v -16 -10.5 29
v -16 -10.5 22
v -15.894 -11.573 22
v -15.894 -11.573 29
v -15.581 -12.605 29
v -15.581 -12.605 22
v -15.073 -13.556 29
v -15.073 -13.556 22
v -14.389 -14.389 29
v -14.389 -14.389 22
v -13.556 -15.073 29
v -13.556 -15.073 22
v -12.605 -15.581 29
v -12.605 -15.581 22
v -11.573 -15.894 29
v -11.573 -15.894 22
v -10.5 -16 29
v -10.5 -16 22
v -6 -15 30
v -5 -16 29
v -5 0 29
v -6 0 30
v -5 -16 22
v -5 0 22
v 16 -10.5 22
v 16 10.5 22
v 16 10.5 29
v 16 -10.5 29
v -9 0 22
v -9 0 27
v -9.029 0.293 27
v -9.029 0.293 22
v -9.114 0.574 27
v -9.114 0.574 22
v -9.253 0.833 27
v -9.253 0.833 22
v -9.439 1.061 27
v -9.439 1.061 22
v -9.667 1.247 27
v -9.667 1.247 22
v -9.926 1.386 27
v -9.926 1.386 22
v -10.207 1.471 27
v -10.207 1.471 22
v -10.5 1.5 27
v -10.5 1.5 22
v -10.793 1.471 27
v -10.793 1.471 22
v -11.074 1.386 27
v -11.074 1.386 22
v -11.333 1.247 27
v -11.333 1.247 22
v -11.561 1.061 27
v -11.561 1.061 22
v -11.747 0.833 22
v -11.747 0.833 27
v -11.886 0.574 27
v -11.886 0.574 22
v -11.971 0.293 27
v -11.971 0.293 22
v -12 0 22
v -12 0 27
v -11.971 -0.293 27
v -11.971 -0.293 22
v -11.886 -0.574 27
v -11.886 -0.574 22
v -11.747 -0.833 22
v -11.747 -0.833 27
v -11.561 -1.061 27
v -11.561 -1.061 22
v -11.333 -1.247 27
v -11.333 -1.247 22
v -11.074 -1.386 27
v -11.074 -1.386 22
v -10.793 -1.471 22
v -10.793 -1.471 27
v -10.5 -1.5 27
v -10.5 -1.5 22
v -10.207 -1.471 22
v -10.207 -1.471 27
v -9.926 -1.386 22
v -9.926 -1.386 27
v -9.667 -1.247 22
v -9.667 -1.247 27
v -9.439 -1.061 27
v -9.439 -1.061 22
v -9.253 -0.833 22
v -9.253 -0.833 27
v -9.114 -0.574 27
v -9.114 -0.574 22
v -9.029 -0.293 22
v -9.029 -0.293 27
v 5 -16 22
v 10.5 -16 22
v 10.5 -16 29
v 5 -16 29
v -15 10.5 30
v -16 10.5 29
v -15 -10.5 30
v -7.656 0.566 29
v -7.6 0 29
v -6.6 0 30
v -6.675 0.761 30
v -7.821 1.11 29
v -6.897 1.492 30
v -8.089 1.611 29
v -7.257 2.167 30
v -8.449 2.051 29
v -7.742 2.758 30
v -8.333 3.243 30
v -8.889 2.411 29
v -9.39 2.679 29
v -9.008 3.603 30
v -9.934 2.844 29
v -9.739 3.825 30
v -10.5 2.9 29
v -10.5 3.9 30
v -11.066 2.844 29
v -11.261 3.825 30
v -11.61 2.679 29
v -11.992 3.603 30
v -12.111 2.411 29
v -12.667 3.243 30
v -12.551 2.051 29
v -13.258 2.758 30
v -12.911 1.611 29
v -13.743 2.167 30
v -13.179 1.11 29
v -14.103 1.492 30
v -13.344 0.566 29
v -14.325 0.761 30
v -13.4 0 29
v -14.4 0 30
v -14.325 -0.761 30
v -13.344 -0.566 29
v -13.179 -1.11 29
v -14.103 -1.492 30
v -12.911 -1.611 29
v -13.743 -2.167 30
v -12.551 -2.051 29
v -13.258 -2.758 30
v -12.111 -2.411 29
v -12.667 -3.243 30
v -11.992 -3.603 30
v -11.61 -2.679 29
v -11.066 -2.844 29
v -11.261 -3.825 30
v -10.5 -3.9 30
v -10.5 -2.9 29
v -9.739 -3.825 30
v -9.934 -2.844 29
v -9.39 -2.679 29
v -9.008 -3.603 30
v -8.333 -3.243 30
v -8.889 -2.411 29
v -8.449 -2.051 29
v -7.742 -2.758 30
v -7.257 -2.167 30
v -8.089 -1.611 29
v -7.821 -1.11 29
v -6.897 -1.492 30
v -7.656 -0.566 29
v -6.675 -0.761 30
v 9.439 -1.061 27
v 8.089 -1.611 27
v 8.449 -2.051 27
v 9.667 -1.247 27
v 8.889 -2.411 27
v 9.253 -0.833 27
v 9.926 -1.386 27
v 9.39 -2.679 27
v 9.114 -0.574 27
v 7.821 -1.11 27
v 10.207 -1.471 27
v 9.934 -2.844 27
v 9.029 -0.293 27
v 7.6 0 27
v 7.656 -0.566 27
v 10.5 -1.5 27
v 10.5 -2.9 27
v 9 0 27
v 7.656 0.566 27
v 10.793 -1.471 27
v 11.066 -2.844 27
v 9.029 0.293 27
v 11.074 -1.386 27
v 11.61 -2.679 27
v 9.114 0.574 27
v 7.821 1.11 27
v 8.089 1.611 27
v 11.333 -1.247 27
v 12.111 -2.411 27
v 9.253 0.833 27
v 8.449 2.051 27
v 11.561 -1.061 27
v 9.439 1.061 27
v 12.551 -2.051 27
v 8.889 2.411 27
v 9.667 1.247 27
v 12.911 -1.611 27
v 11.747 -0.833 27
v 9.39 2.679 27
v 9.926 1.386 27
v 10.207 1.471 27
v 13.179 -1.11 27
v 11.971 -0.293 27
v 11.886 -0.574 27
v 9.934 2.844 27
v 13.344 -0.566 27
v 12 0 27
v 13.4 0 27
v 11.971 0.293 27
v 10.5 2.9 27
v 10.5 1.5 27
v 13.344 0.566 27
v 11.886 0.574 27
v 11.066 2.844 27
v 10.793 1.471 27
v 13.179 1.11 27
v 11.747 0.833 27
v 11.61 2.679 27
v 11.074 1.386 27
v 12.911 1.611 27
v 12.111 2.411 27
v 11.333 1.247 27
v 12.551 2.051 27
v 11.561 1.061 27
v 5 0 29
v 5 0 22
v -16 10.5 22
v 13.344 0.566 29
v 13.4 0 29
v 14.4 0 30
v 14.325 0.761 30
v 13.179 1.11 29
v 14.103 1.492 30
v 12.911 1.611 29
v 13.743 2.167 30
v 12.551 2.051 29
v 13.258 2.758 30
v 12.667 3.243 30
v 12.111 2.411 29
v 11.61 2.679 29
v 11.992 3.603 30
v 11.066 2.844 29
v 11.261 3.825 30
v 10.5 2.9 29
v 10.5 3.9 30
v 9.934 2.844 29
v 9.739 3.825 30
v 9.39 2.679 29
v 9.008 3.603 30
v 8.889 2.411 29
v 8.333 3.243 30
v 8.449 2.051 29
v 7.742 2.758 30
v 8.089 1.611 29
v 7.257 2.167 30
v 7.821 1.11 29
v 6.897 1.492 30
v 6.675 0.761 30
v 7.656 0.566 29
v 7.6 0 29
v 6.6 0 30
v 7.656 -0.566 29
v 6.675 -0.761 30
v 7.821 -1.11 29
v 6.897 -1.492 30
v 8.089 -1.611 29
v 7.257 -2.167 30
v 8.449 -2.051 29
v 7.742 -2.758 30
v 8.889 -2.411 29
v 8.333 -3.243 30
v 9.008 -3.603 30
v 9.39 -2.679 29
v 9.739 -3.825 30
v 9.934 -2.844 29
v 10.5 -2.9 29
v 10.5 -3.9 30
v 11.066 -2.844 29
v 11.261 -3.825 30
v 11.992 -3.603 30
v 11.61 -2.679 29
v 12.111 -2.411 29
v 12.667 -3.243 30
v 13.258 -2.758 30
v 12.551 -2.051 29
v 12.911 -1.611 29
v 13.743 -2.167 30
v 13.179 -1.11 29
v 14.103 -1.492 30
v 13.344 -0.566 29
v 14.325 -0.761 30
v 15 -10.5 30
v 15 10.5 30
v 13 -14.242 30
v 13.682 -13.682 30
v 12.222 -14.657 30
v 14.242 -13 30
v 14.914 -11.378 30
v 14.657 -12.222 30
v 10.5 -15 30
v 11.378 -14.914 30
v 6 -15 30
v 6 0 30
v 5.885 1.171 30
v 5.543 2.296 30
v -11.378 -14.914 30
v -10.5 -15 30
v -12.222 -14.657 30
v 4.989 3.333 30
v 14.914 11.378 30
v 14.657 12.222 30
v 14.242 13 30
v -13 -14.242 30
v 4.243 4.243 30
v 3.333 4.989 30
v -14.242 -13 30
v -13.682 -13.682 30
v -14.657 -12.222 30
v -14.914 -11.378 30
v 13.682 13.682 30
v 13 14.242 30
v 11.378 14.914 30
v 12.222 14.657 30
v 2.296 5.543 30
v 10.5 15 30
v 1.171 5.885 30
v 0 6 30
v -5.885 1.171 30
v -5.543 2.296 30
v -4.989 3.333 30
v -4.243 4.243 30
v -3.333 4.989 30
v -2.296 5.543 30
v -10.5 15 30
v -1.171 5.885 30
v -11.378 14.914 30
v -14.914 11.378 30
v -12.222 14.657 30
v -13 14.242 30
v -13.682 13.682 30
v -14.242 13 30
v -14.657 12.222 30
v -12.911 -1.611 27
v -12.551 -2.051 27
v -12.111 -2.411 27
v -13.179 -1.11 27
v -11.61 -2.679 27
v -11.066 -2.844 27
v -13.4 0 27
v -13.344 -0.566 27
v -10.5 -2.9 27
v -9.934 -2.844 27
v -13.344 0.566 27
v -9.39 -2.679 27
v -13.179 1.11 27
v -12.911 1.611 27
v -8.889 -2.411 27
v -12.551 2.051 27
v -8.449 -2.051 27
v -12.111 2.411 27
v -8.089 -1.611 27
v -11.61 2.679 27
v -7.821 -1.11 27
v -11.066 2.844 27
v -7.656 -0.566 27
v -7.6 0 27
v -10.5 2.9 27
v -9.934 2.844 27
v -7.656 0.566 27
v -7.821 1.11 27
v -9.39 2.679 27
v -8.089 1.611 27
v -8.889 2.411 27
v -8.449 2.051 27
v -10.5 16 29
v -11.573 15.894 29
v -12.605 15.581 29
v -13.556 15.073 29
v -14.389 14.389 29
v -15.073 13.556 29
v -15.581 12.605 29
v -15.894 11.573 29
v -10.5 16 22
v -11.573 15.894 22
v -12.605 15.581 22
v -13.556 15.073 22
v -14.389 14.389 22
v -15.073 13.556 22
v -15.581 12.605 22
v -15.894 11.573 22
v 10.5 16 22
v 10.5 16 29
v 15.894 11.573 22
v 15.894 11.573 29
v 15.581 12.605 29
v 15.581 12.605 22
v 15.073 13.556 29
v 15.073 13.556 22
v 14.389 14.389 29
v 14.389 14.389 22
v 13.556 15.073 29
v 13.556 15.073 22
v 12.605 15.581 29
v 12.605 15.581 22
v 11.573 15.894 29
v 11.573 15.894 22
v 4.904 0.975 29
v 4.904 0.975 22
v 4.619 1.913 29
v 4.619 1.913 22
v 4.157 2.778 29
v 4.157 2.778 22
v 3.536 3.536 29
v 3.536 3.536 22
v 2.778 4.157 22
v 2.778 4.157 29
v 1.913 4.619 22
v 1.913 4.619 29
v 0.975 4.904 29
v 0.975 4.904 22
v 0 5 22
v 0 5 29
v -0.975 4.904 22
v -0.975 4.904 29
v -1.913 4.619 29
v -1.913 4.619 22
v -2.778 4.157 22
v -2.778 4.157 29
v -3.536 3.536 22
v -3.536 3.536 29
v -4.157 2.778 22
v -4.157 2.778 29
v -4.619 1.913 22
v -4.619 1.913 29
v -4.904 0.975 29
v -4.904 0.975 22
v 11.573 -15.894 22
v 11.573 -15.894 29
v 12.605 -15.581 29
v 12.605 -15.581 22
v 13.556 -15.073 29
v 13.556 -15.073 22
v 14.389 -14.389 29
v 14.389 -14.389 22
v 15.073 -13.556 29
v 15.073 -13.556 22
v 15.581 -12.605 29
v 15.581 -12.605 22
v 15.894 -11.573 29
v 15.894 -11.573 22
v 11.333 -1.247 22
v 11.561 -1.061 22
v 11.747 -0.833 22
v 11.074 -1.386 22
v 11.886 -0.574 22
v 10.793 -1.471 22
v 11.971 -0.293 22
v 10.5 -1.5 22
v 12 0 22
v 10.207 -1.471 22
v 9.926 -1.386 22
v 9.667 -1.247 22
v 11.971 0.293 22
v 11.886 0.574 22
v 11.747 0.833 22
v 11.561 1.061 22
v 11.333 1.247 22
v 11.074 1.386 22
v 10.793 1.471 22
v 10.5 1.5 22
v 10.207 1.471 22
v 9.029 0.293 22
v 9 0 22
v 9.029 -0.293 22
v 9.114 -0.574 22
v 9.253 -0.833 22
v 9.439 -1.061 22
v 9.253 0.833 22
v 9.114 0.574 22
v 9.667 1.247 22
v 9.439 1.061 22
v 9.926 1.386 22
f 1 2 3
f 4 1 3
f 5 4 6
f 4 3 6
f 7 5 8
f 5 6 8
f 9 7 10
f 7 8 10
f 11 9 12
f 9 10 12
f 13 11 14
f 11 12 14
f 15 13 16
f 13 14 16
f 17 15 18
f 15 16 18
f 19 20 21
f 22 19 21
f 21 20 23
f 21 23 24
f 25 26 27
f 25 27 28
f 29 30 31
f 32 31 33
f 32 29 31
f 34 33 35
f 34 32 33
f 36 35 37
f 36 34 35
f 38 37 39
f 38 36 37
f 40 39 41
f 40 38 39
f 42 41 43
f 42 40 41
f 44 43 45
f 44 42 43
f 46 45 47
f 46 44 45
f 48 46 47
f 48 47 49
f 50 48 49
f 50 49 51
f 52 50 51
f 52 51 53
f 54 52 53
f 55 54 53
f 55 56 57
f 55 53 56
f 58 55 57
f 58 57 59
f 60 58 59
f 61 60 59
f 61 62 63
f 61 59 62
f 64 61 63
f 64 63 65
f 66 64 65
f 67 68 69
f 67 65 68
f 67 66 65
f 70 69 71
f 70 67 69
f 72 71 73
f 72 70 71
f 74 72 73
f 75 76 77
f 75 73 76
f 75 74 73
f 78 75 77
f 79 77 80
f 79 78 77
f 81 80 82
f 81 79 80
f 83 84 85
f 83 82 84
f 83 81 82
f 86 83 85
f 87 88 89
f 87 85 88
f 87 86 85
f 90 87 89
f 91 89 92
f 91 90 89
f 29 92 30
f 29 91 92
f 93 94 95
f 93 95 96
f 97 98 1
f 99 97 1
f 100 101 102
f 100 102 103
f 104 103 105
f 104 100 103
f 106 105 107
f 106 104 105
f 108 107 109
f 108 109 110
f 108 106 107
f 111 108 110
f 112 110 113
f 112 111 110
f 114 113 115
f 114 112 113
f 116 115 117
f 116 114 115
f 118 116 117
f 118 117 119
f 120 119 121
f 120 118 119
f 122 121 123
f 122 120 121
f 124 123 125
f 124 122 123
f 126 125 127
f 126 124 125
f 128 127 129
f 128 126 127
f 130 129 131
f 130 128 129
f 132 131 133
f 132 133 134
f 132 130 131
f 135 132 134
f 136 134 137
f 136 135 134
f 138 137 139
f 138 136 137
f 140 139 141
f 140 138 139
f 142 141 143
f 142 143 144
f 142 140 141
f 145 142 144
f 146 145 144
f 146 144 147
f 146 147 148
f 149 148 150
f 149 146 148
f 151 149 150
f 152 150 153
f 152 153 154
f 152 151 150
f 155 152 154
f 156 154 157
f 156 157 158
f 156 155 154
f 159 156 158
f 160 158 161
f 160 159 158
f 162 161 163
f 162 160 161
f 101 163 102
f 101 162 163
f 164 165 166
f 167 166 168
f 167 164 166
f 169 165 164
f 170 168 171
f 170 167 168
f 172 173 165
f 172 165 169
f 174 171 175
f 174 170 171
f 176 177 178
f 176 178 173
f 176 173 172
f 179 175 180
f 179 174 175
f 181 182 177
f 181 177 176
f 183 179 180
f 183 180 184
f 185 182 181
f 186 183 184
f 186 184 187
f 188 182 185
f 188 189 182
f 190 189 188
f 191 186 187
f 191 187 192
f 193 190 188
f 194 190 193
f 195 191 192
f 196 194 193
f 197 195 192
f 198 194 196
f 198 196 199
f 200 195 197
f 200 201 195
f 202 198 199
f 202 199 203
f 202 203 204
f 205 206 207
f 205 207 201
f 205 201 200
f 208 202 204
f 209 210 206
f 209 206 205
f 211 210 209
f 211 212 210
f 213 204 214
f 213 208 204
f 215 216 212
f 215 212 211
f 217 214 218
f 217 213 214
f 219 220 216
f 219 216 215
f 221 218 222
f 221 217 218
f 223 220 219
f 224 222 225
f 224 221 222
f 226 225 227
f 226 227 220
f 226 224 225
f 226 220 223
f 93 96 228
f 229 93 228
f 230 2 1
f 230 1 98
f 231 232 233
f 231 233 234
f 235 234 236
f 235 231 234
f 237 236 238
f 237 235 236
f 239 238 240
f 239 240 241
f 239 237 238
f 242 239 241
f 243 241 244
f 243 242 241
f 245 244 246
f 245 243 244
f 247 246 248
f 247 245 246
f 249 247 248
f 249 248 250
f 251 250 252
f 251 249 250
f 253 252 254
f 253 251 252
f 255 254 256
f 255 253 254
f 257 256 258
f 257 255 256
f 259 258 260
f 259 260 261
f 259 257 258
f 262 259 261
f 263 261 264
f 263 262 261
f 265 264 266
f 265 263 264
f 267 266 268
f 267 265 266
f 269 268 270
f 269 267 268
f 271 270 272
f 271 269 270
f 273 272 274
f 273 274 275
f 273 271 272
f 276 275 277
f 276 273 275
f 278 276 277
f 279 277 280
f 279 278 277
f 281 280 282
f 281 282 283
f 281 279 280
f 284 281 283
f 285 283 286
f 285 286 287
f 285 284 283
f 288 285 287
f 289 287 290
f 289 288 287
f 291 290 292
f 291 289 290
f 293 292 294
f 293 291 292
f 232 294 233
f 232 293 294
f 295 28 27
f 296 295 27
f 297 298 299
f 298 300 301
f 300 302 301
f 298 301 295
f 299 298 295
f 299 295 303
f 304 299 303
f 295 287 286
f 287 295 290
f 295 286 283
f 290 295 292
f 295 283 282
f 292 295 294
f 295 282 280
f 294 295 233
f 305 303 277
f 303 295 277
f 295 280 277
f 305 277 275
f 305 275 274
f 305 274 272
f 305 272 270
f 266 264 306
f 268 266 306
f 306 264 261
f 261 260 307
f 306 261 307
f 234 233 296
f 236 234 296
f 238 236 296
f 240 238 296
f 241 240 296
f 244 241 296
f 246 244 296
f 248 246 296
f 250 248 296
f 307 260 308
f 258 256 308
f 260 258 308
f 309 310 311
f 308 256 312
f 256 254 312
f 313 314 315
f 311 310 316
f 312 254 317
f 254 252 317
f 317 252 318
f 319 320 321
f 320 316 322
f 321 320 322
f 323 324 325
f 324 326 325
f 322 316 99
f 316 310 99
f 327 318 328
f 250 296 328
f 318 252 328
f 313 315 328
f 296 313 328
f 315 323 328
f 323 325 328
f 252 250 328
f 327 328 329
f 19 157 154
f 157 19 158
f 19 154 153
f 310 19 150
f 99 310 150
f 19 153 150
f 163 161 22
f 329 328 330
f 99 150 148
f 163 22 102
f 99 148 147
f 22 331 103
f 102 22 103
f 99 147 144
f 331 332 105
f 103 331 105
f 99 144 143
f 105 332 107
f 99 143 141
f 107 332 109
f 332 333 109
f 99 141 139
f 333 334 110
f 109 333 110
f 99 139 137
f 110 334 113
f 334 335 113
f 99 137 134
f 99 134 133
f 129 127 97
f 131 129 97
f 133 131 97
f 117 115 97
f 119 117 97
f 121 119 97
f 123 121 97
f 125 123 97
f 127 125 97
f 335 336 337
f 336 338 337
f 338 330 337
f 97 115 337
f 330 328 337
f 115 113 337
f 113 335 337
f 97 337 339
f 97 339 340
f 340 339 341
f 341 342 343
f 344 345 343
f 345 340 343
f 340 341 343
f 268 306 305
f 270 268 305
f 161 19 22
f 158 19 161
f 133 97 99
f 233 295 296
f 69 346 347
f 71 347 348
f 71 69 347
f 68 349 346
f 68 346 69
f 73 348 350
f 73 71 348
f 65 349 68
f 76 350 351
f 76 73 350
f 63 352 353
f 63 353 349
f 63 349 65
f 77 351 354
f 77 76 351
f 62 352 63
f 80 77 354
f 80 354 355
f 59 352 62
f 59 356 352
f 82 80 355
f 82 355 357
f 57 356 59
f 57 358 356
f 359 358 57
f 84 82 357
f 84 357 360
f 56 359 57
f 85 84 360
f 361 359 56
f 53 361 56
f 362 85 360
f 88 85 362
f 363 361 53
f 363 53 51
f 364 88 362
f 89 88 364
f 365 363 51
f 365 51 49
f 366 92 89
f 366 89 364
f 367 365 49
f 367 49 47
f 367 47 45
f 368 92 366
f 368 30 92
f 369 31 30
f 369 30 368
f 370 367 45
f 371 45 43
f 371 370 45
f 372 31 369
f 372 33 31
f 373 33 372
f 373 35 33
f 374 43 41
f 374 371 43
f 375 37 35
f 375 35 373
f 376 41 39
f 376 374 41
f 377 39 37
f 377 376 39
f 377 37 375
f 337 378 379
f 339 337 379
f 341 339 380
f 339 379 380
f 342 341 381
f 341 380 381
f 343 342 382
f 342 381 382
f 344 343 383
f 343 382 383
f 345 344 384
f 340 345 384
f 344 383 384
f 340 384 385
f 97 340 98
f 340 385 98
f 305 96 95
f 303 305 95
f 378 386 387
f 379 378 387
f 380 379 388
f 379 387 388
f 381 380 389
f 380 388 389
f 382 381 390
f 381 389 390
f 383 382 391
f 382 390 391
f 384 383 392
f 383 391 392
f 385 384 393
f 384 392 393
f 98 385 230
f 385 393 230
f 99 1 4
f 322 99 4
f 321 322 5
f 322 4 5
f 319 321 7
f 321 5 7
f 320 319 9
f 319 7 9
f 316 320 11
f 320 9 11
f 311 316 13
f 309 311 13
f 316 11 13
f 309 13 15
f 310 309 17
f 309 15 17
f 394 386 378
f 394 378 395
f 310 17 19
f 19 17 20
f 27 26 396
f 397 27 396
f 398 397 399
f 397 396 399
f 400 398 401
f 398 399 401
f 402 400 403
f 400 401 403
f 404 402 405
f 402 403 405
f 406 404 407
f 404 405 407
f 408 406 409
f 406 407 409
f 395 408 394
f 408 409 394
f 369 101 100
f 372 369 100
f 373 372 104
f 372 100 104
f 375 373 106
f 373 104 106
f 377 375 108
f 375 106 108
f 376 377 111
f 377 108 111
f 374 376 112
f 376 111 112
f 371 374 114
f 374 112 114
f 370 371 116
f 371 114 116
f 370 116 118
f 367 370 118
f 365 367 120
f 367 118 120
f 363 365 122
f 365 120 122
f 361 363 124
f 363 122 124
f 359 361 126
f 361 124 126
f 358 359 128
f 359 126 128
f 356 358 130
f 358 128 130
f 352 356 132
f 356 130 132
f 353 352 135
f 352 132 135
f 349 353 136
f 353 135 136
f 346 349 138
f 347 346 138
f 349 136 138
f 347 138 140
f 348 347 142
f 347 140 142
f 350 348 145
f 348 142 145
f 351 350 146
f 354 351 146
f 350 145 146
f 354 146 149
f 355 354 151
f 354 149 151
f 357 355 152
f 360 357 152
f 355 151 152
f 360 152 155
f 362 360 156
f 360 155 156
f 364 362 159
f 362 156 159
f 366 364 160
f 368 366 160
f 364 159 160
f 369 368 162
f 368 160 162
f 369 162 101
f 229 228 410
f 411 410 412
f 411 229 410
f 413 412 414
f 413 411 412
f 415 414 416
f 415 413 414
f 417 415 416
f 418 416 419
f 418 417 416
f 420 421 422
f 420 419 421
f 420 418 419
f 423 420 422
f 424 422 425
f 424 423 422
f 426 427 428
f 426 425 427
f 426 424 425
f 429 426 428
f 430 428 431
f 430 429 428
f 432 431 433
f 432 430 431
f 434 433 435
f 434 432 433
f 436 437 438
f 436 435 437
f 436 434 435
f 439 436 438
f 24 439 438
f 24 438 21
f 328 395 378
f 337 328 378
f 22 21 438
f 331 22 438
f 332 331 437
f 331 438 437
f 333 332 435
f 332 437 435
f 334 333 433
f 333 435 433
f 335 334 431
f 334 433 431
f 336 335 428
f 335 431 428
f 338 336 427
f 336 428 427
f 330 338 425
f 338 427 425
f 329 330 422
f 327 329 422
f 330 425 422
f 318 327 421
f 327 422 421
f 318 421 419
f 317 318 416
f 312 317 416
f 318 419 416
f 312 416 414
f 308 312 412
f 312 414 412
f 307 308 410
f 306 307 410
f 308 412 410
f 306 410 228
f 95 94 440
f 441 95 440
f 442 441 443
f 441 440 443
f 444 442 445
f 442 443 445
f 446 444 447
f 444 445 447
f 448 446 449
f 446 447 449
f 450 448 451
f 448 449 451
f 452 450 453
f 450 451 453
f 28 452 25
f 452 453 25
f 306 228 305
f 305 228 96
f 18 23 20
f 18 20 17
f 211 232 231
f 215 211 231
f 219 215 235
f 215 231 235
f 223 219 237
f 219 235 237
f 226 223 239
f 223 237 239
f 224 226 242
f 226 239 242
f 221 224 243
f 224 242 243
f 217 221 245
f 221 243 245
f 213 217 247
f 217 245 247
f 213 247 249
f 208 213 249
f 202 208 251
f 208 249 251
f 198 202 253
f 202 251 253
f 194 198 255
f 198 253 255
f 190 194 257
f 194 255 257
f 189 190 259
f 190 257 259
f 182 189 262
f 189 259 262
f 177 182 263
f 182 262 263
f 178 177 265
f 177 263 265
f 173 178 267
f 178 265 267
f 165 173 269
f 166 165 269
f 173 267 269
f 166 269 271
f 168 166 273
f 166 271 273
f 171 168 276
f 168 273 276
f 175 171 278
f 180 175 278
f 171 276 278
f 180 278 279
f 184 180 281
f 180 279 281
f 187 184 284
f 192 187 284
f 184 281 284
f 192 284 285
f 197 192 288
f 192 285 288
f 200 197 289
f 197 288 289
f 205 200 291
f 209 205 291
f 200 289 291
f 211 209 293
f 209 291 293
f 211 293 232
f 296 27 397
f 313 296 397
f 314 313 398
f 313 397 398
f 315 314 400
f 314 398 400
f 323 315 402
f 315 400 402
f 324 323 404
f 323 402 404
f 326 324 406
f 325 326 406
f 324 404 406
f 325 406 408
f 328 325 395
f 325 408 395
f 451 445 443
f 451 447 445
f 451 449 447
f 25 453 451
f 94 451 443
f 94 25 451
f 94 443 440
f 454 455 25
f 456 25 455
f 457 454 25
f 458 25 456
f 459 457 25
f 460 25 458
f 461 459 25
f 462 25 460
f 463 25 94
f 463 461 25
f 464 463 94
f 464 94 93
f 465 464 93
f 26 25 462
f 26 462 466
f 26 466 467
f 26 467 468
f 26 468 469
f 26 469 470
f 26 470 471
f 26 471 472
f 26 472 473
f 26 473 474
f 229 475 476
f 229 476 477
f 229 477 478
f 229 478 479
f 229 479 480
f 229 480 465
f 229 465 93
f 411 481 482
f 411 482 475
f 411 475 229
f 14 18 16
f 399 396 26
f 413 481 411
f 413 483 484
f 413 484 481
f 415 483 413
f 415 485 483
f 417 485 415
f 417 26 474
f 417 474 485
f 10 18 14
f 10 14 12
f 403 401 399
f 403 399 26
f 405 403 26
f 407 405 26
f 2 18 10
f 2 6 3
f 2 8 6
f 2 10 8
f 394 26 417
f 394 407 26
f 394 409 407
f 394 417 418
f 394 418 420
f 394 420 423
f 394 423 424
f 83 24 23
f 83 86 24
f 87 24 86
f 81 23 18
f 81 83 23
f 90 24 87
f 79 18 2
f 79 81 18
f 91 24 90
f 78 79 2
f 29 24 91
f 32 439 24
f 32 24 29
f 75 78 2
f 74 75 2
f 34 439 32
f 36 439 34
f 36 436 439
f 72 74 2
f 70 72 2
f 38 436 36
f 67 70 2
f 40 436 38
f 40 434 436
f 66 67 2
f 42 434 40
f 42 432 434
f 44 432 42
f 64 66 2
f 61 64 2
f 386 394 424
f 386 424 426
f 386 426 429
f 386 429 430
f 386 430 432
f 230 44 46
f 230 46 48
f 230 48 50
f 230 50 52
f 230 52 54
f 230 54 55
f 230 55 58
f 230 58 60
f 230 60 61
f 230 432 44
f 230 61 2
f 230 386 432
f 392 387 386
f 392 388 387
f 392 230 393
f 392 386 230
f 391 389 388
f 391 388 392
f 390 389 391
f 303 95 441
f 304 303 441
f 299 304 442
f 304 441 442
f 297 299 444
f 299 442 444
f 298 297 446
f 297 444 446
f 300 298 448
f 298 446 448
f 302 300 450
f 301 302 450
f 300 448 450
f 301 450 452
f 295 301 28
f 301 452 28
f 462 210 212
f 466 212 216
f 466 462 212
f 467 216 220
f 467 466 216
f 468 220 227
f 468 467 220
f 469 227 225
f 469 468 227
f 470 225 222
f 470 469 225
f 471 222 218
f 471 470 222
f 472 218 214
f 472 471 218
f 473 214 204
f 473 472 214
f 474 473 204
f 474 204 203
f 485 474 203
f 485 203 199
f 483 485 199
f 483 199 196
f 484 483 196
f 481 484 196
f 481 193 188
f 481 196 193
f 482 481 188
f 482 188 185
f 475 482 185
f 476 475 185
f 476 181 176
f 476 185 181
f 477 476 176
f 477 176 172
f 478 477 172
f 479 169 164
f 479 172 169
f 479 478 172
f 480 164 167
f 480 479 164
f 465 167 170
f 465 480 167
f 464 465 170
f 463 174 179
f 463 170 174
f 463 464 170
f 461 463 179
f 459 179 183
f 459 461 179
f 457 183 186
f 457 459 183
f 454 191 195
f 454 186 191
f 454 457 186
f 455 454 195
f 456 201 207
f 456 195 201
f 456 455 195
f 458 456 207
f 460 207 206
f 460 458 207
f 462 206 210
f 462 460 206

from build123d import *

# Parameters (mm, degrees)
SKETCH_R        = 5
SKETCH_R_2      = 1.5
PAD_DEPTH       = 8
SKETCH029_W     = 10
SKETCH029_H     = 16
POCKET_DEPTH    = 8.001
SKETCH030_R     = 2.9
POCKET016_DEPTH = 3
CHAMFER_SIZE    = 1


with BuildPart() as part:
    # Sketch → Pad (new body)
    with BuildSketch(Plane.XY):
        with BuildLine():
            Line((-10.5, 16), (10.5, 16))
            ThreePointArc((16, 10.5), (14.389087, 14.389087), (10.5, 16))
            Line((16, 10.5), (16, -10.5))
            ThreePointArc((10.5, -16), (14.389087, -14.389087), (16, -10.5))
            Line((10.5, -16), (-10.5, -16))
            ThreePointArc((-16, -10.5), (-14.389087, -14.389087), (-10.5, -16))
            Line((-16, -10.5), (-16, 10.5))
            ThreePointArc((-10.5, 16), (-14.389087, 14.389087), (-16, 10.5))
        make_face()
        Circle(SKETCH_R, mode=Mode.SUBTRACT)
        with Locations((-10.5, 0)):
            Circle(SKETCH_R_2, mode=Mode.SUBTRACT)
        with Locations((10.5, 0)):
            Circle(SKETCH_R_2, mode=Mode.SUBTRACT)
    extrude(amount=PAD_DEPTH)

    # Sketch029 (on Face13 of Pad) → Pocket (cut, through all)
    with BuildSketch(Plane.XY.offset(8)):
        with Locations((0, -8)):
            Rectangle(SKETCH029_W, SKETCH029_H)
    extrude(amount=-POCKET_DEPTH, mode=Mode.SUBTRACT)

    # Sketch030 (on Face5 of Pocket) → Pocket016 (cut)
    with BuildSketch(Plane.XY.offset(8)):
        with Locations((-10.5, 0)):
            Circle(SKETCH030_R)
        with Locations((10.5, 0)):
            Circle(SKETCH030_R)
    extrude(amount=-POCKET016_DEPTH, mode=Mode.SUBTRACT)

    # Chamfer
    chamfer_edges = [part.edges().sort_by_distance(p)[0] for p in [
        (-14.389087, -14.389087, 8),
        (-16, 0, 8),
        (-7.75, -16, 8),
        (-14.389087, 14.389087, 8),
        (-5, -8, 8),
        (0, 16, 8),
        (0, 5, 8),
        (14.389087, 14.389087, 8),
        (5, -8, 8),
        (16, 0, 8),
        (7.75, -16, 8),
        (14.389087, -14.389087, 8),
        (7.6, 0, 8),
        (-13.4, 0, 8),
    ]]
    chamfer(chamfer_edges, length=CHAMFER_SIZE)


with BuildPart() as part_1:
    # Body placement: moved
    add(part.part.moved(Location((0, 0, 22))))


solid = part_1.part
